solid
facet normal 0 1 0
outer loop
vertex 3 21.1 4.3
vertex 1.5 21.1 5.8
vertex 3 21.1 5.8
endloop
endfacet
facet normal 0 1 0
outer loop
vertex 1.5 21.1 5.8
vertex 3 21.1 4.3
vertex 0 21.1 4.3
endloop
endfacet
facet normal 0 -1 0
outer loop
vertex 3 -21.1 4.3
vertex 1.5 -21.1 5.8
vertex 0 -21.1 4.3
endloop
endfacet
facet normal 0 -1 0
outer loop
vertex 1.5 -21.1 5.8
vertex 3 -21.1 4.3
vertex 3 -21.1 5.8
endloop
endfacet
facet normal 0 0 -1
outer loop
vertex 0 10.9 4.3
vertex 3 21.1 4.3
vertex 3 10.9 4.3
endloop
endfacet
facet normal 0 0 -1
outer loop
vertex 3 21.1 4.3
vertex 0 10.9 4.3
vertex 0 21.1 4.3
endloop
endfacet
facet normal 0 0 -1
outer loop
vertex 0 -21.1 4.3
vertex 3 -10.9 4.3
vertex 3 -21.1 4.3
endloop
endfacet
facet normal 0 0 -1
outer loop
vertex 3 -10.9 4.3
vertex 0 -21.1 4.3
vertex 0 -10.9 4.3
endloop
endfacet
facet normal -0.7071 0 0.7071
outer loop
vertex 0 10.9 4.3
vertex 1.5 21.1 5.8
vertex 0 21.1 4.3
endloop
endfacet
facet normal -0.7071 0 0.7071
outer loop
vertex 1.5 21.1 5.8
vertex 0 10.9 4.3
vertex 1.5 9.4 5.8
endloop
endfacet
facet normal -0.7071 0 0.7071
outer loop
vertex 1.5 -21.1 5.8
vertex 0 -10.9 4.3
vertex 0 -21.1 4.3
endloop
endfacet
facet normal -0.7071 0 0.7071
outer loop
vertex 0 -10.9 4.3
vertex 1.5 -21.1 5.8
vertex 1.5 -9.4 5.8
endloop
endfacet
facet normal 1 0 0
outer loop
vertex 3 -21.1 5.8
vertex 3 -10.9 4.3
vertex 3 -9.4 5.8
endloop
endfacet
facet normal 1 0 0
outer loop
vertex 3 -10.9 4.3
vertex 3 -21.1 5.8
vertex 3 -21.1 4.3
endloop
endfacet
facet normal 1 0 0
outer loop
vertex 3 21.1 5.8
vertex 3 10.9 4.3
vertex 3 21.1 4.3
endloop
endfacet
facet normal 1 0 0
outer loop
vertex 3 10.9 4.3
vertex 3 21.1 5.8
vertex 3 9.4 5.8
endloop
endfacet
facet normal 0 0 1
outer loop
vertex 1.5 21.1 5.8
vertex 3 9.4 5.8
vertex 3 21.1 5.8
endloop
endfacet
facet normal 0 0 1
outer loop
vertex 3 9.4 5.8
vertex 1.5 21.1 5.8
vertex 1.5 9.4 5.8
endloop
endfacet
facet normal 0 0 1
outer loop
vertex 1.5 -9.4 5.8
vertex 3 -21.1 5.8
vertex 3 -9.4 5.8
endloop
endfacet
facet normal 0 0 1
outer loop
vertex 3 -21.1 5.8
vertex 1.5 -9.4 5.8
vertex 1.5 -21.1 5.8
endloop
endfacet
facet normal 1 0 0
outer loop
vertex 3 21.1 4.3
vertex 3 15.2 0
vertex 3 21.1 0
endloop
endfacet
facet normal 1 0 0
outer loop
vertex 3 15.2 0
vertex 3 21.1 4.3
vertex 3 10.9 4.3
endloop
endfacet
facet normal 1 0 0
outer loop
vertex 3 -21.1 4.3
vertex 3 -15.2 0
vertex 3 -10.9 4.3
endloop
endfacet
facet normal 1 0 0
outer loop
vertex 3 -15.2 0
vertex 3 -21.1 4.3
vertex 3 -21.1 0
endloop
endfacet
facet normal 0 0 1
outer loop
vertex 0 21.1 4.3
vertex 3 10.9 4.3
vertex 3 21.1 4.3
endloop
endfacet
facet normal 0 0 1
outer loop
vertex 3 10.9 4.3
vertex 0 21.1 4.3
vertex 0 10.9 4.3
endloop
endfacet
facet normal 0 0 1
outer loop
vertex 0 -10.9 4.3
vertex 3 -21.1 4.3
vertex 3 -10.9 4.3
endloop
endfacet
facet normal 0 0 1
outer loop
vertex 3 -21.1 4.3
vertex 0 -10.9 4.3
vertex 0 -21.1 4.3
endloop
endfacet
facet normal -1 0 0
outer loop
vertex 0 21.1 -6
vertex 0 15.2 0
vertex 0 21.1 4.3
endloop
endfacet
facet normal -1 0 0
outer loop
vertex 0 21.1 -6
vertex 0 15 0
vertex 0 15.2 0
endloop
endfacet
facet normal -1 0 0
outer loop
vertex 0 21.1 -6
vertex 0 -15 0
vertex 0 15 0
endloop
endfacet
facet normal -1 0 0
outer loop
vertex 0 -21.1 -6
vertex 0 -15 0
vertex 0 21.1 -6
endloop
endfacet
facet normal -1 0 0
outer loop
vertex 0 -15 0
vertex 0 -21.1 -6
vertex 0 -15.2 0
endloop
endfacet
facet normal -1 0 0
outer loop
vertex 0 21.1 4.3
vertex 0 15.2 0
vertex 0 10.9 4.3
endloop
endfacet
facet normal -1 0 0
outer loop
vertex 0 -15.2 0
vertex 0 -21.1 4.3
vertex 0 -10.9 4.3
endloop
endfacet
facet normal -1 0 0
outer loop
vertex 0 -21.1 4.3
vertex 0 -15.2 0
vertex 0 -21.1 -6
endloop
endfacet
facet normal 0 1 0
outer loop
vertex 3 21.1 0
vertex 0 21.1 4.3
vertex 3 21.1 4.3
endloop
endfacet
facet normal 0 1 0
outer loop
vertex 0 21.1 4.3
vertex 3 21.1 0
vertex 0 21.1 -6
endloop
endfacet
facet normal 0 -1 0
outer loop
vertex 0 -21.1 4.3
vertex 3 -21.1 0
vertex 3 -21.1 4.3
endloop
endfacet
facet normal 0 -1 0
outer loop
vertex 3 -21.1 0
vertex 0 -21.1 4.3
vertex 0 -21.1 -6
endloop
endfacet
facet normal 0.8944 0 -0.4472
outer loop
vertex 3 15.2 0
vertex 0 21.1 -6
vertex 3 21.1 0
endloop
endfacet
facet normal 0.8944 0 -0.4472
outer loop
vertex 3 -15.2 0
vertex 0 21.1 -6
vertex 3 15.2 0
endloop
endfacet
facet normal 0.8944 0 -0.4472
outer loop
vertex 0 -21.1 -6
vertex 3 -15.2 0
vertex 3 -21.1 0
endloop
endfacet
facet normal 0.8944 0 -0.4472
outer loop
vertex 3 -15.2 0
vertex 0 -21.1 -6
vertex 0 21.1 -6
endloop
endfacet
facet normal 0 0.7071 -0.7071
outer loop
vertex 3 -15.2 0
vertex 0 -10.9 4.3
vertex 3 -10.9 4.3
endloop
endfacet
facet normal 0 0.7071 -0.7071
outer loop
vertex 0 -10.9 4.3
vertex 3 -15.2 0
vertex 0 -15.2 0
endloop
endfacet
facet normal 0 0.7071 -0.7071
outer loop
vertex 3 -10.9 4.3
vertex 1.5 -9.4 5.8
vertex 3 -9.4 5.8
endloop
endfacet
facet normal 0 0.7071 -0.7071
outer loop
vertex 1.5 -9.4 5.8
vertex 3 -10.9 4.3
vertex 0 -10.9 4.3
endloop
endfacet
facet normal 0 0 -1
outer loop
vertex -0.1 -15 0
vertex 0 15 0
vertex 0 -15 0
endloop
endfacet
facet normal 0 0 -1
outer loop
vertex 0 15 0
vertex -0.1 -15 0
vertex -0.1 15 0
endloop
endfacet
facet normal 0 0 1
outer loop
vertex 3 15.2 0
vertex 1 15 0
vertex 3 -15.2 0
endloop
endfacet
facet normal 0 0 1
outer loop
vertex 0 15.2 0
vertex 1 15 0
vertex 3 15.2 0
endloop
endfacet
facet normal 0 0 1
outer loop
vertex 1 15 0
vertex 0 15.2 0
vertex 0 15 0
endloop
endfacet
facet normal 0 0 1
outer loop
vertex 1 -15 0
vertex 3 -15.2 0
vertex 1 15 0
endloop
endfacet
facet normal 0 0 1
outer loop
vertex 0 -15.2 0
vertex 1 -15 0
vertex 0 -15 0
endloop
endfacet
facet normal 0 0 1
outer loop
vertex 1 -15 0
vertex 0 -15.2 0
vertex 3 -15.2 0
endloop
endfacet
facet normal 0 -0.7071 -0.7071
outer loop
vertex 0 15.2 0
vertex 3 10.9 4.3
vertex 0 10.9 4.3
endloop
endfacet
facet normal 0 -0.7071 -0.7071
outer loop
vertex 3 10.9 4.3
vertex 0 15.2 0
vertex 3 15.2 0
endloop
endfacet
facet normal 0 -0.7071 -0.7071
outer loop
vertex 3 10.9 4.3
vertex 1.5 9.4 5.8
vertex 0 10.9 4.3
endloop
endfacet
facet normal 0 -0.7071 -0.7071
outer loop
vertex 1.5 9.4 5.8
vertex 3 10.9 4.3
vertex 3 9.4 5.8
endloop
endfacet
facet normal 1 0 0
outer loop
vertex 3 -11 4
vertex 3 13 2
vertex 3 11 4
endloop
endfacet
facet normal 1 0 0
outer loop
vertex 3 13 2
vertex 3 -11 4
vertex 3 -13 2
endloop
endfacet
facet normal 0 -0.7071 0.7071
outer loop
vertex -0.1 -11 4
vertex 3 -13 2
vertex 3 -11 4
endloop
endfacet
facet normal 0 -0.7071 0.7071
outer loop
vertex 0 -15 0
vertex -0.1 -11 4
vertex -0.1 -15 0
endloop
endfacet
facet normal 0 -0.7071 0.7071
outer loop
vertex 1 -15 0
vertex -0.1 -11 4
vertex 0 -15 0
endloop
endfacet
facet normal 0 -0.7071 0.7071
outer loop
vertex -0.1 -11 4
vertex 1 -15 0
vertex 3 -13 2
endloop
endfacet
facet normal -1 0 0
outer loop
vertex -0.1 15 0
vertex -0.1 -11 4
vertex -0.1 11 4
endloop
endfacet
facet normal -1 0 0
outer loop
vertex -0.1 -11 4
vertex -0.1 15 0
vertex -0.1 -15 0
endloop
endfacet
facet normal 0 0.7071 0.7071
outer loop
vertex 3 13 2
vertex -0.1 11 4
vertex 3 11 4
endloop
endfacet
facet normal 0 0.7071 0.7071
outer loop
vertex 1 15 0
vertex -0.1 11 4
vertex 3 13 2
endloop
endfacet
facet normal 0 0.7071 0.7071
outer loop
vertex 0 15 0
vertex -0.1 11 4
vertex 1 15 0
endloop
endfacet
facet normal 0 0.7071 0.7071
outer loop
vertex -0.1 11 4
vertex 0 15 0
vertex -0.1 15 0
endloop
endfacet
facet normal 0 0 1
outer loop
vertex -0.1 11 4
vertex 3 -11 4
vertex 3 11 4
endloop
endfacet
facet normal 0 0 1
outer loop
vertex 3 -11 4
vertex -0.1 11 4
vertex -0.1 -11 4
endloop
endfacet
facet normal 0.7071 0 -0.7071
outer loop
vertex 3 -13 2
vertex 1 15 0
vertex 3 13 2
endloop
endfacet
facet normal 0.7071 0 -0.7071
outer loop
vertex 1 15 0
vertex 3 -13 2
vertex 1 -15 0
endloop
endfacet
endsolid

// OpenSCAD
// file: Primitives.scad
module triangular_profile(width, height, depth, points=[[0.5, 0.5],[1, 0], [0, 0]]){
  translate([0, depth, 0]) {
    rotate(90, [1, 0, 0]) {
      linear_extrude(height=depth) {
        polygon(
          points=[
            [width * points[0][0], height * points[0][1]], // top
            [width * points[1][0], height * points[1][1]], // right
            [width * points[2][0], height * points[2][1]] // left
          ], 
          paths=[[0,1,2]]
        );
      }
    }
  }
}
// file: Alignments.scad
module mirror(offsetX, offsetY, offsetZ) {
  translate([offsetX, offsetY, offsetZ]) {
    children(0);
  }

  translate([-offsetX, -offsetY, -offsetZ]) {
    children(0);
  }
}


module center(width, depth, height) {
  translate([-width / 2, -depth / 2, -height / 2]) {
    children();
  }
}
// main file
use <Alignments.scad>
use <Primitives.scad>

module wall_mount_base (depth = 20, height = 10, wall_thickness = 2, tolerance = 0.2) {
  translate([0, -depth / 2, 0]) {
    baseThickness = wall_thickness + tolerance * 2;
    baseHeight = wall_thickness * 2;
    
    union() {
      translate([-tolerance, 0, 0]) {
        rotate(-90, [1, 0, 0]) {
          linear_extrude(height=depth) {
              polygon(points=[[0,0],[0, baseHeight],[baseThickness, 0]], paths=[[0,1,2]]);
          }
        }
      }

      translate([tolerance, 0, 0]) {
        for(i=[0:$children-1])
          children(i); // do each of the shapes that come after us
      }
    }
  }
}

module no_mounts() {}

module wall_mounted_stopper (depth = 32, height = 10, wall_thickness = 2, tolerance = 0.2) {
  wall_mount_base(depth, height, wall_thickness, tolerance) {
    cube(size=[wall_thickness, depth, wall_thickness]);
  }
}

module wall_mounted_hinge (tongueDepth = 30, height = 10, wall_thickness = 2, tolerance = 0.1) {
  sideDepth = wall_thickness * 3;
  fullDepth = tongueDepth + (sideDepth + tolerance) * 2;

  thickness = wallMountedClickLockThickness(wall_thickness);

  difference() {  
    side_fixture_body (fullDepth, height, wall_thickness, tolerance);

    negativeDepth = tongueDepth + tolerance * 2;
    translate([-tolerance, -negativeDepth / 2, tolerance]) {
      cube(size=[thickness + tolerance * 2, negativeDepth, thickness]);
    }
  }
}

module wall_mounted_hinge_tongue (depth = 30, height = 10, wall_thickness = 2, tolerance = 0.1) {
  thickness = wallMountedClickLockThickness(wall_thickness);
  halfThickness = thickness / 2;

  module negative(depth = 30, height = 10, wall_thickness = 2) {
    translate([0, -depth/2, -height]) {
      rotate(-60, [0, 0, 1]) {
        cube(size=[thickness * 2, wall_thickness * 3, height * 2]);
      }
    }
  }

  difference() {
    translate([-tolerance, -depth / 2, 0]) {
      cube(size=[halfThickness, depth, halfThickness]);
  
      translate([halfThickness, 0, 0]) {
        triangular_profile(halfThickness, halfThickness, depth, points=[
          [0, 1], [1, 1], [0, 0]
        ]);
      }
  
      translate([0, 0, halfThickness]) {
        cube(size=[thickness, depth, halfThickness]);
      }
    }

    negative(depth, height, wall_thickness);
    rotate(180, [1, 0, 0]) {
      negative(depth, height, wall_thickness);
    }
  }
}

module wall_mounted_snap_lock (tongueDepth = 30, wall_thickness = 2, tolerance = 0.1) {
  height = 10;
  sideDepth = wall_thickness * 3;
  fullDepth = tongueDepth + (sideDepth + tolerance) * 2;

  thickness = wallMountedClickLockThickness(wall_thickness);

  difference() {  
    side_fixture_body (fullDepth, height, wall_thickness, tolerance);

    translate([-tolerance, 0, 0]) {
      wall_mounted_hinge_lock_tongue_triangle(thickness + tolerance * 2, tongueDepth + tolerance * 4);
    }
  }
}

module wall_mounted_hinge_lock_tongue_triangle (width, depth, tolerance = 0) {
  translate([0, depth / 2, 0]) {
    rotate(-90, [0, 0, 1]) {
      triangular_profile(depth + tolerance, depth + tolerance, width + tolerance);
    }
  }
}

module wall_mounted_snap_lock_tongue (depth = 30, wall_thickness = 2, tolerance = 0.1) {
  thickness = wallMountedClickLockThickness(wall_thickness);
  halfThickness = thickness / 2;
  
  difference() {
    translate([-tolerance, 0, 0]) {
      wall_mounted_hinge_lock_tongue_triangle(thickness + tolerance, depth);
    }

    translate([-thickness / 2, -depth, wall_thickness * 2]) {
      cube(size=[thickness * 2, depth * 2, depth]);
    }

    translate([thickness - wall_thickness, 0, 0]) {
      rotate(-45, [0, 1, 0]) {
        translate([0, -depth, -wall_thickness]) {
          cube(size=[thickness * 2, depth * 2, wall_thickness]);
        }
      }
    }
  }
}

function wallMountedClickLockThickness(wall_thickness = 2) = wall_thickness * 1.5;

module side_fixture_body (fullDepth = 50, height = 10, wall_thickness = 2, tolerance = 0.1) {
  thickness = wallMountedClickLockThickness(wall_thickness);

  wall_mount_base(fullDepth, height, thickness, 0) {
    cube(size=[thickness, fullDepth, wall_thickness * 2 + tolerance * 3]);

    translate([0, 0, wall_thickness * 2 + tolerance * 3]) {
      triangular_profile(thickness, thickness, fullDepth, points=[
        [0.5, 0.5], [1, 0], [0, 0]
      ]);

      translate([thickness / 2, 0, 0])
        cube(size=[thickness / 2, fullDepth, thickness / 2]);
    }
  }
}

module wall_mounted_click_lock (fullDepth = 50, tongueDepth = 30, height = 10, wall_thickness = 2, tolerance = 0.1) {
  thickness = wallMountedClickLockThickness(wall_thickness);

  difference() {  
    side_fixture_body (fullDepth, height, wall_thickness, tolerance);

    negativeDepth = tongueDepth + wall_thickness;
    translate([-tolerance, -negativeDepth / 2, tolerance]) {
      cube(size=[tolerance * 4, negativeDepth, wall_thickness * 2]);
    }

    translate([tolerance, 0, tolerance]) {
      lid_mounted_click_lock_tongue(fullDepth = fullDepth, tongueDepth = negativeDepth, wall_thickness = wall_thickness + tolerance, tolerance = 0);
    }
  }
}

module lid_mounted_click_lock_tongue (fullDepth = 50, tongueDepth = 30, fingerNotchDepth = 20, wall_thickness = 2, tolerance = 0.1) {
  translate([-tolerance, -tongueDepth / 2, 0]) {
    difference() {
      // Main triangular body
      translate([0, 0, wall_thickness * 2]) {
        rotate(-90, [1, 0, 0]) {
          linear_extrude(height=tongueDepth) {
            polygon(
              points=[
                [0,0],
                [0, wall_thickness * 2],
                [wall_thickness, wall_thickness]
              ], 
              paths=[[0,1,2]]
            );
          }
        }
      }
      
      // Side cut
      translate([wall_thickness / 2, -wall_thickness, -tolerance]) {
        rotate(30, [0, 0, 1]) {
          cube(size=[wall_thickness * 2, wall_thickness, wall_thickness * 2 + tolerance * 2]);
        }
      }

      // Side cut
      translate([wall_thickness / 2, tongueDepth + wall_thickness, wall_thickness * 2 + tolerance]) {
        rotate(180, [1, 0, 0]) {
          rotate(30, [0, 0, 1]) {
            cube(size=[wall_thickness * 2, wall_thickness, wall_thickness * 2 + tolerance * 2]);
          }
        }
      }
    }

    // Base
    translate([-wall_thickness, 0, 0]) {
      cube(size=[wall_thickness, tongueDepth, wall_thickness * 2]);
    }

    // Tongue claws
    translate([0, tongueDepth / 2, 0]) {
      sideLength = (wall_thickness * 2) * sin(45);

      mirror(0, sideLength * 1.5, 0) {
        lid_mounted_click_lock_tongue_claw(wall_thickness);
      }
    }
  }

  if (fingerNotchDepth > 0) {
    fingerNotchWidth = wallMountedClickLockThickness(wall_thickness);
    clickLockOffset = fullDepth - tongueDepth + wall_thickness;
    translate([0, -(tongueDepth + clickLockOffset) / 2, 0]) {
      translate([0, tongueDepth + clickLockOffset, 0]) {
        lid_mounted_click_lock_tongue_finger_lip(fingerNotchDepth, wall_thickness);
      }
  
      translate([0, - fingerNotchDepth, 0]) {
        lid_mounted_click_lock_tongue_finger_lip(fingerNotchDepth, wall_thickness);
      }
    }
  }
}

module lid_mounted_click_lock_tongue_claw (wall_thickness = 2) {
  size = wall_thickness * 2;
  sideLength = size * sin(45);
  centerSize = wall_thickness / 2;
  
  difference() {
    union() {
      mirror(0, centerSize / 2, 0) {
        rotate(45, [1, 0, 0]) {
          cube(size=[wall_thickness, sideLength, sideLength]);
        }
      }
      
      center(0, centerSize, 0) {
        cube(size=[wall_thickness, centerSize, size]);
      }
    }
    
    translate([0, -sideLength, 0]) {
      rotate(45, [0, 1, 0]) {
        cube(size=[sideLength, sideLength*2, sideLength*2]);
      }
    }
  }
}


module lid_mounted_click_lock_tongue_finger_lip (fingerNotchDepth = 20, wall_thickness = 2) {
  fingerNotchWidth = wallMountedClickLockThickness(wall_thickness);
  offset = fingerNotchWidth - wall_thickness;

  cube(size=[offset, fingerNotchDepth, wall_thickness]);
  
  translate([offset, 0, 0]) {
    triangular_profile(wall_thickness, wall_thickness, fingerNotchDepth, points=[
      [0, 1], [1, 1], [0, 0]
    ]);
  }
  translate([0, 0, wall_thickness]) {
    cube(size=[fingerNotchWidth, fingerNotchDepth, wall_thickness]);
  }
}


module double_wall_mount(width) {
  offset = width / 5;

  translate([0, offset, 0]) {
    children(0);
  }

  translate([0, -offset, 0]) {
    children(0);
  }
}



wall_thickness = 2;
tolerance = 0;
tongueDepth = 30;
fullDepth= 30;
fingerNotchDepth = 10;


// wall_mounted_stopper(depth=depth, wall_thickness=wall_thickness, tolerance=tolerance);
//wall_mounted_hinge(wall_thickness=wall_thickness);
//wall_mounted_hinge_tongue(wall_thickness=wall_thickness);
//lid_mounted_click_lock_tongue_finger_lip (fingerNotchDepth, wall_thickness);
// lid_mounted_click_lock_tongue_claw();
wall_mounted_snap_lock(wall_thickness=wall_thickness);
wall_mounted_snap_lock_tongue(wall_thickness=wall_thickness);

/*
difference() {
  union() {
    wall_mounted_click_lock(
      fullDepth = fullDepth, 
      tongueDepth=tongueDepth, 
      wall_thickness=wall_thickness, 
      tolerance=tolerance
    );

    //lid_mounted_click_lock_tongue(
    //  fullDepth = fullDepth, 
    //  tongueDepth=tongueDepth, 
    //  fingerNotchDepth = fingerNotchDepth, 
    //  wall_thickness=wall_thickness, 
    //  tolerance=tolerance
    //);
  }
  
  //translate([-10, 4.5, -10]) {
  //  cube(size=[20, 50, 20]) ;
  //}
}
*/
